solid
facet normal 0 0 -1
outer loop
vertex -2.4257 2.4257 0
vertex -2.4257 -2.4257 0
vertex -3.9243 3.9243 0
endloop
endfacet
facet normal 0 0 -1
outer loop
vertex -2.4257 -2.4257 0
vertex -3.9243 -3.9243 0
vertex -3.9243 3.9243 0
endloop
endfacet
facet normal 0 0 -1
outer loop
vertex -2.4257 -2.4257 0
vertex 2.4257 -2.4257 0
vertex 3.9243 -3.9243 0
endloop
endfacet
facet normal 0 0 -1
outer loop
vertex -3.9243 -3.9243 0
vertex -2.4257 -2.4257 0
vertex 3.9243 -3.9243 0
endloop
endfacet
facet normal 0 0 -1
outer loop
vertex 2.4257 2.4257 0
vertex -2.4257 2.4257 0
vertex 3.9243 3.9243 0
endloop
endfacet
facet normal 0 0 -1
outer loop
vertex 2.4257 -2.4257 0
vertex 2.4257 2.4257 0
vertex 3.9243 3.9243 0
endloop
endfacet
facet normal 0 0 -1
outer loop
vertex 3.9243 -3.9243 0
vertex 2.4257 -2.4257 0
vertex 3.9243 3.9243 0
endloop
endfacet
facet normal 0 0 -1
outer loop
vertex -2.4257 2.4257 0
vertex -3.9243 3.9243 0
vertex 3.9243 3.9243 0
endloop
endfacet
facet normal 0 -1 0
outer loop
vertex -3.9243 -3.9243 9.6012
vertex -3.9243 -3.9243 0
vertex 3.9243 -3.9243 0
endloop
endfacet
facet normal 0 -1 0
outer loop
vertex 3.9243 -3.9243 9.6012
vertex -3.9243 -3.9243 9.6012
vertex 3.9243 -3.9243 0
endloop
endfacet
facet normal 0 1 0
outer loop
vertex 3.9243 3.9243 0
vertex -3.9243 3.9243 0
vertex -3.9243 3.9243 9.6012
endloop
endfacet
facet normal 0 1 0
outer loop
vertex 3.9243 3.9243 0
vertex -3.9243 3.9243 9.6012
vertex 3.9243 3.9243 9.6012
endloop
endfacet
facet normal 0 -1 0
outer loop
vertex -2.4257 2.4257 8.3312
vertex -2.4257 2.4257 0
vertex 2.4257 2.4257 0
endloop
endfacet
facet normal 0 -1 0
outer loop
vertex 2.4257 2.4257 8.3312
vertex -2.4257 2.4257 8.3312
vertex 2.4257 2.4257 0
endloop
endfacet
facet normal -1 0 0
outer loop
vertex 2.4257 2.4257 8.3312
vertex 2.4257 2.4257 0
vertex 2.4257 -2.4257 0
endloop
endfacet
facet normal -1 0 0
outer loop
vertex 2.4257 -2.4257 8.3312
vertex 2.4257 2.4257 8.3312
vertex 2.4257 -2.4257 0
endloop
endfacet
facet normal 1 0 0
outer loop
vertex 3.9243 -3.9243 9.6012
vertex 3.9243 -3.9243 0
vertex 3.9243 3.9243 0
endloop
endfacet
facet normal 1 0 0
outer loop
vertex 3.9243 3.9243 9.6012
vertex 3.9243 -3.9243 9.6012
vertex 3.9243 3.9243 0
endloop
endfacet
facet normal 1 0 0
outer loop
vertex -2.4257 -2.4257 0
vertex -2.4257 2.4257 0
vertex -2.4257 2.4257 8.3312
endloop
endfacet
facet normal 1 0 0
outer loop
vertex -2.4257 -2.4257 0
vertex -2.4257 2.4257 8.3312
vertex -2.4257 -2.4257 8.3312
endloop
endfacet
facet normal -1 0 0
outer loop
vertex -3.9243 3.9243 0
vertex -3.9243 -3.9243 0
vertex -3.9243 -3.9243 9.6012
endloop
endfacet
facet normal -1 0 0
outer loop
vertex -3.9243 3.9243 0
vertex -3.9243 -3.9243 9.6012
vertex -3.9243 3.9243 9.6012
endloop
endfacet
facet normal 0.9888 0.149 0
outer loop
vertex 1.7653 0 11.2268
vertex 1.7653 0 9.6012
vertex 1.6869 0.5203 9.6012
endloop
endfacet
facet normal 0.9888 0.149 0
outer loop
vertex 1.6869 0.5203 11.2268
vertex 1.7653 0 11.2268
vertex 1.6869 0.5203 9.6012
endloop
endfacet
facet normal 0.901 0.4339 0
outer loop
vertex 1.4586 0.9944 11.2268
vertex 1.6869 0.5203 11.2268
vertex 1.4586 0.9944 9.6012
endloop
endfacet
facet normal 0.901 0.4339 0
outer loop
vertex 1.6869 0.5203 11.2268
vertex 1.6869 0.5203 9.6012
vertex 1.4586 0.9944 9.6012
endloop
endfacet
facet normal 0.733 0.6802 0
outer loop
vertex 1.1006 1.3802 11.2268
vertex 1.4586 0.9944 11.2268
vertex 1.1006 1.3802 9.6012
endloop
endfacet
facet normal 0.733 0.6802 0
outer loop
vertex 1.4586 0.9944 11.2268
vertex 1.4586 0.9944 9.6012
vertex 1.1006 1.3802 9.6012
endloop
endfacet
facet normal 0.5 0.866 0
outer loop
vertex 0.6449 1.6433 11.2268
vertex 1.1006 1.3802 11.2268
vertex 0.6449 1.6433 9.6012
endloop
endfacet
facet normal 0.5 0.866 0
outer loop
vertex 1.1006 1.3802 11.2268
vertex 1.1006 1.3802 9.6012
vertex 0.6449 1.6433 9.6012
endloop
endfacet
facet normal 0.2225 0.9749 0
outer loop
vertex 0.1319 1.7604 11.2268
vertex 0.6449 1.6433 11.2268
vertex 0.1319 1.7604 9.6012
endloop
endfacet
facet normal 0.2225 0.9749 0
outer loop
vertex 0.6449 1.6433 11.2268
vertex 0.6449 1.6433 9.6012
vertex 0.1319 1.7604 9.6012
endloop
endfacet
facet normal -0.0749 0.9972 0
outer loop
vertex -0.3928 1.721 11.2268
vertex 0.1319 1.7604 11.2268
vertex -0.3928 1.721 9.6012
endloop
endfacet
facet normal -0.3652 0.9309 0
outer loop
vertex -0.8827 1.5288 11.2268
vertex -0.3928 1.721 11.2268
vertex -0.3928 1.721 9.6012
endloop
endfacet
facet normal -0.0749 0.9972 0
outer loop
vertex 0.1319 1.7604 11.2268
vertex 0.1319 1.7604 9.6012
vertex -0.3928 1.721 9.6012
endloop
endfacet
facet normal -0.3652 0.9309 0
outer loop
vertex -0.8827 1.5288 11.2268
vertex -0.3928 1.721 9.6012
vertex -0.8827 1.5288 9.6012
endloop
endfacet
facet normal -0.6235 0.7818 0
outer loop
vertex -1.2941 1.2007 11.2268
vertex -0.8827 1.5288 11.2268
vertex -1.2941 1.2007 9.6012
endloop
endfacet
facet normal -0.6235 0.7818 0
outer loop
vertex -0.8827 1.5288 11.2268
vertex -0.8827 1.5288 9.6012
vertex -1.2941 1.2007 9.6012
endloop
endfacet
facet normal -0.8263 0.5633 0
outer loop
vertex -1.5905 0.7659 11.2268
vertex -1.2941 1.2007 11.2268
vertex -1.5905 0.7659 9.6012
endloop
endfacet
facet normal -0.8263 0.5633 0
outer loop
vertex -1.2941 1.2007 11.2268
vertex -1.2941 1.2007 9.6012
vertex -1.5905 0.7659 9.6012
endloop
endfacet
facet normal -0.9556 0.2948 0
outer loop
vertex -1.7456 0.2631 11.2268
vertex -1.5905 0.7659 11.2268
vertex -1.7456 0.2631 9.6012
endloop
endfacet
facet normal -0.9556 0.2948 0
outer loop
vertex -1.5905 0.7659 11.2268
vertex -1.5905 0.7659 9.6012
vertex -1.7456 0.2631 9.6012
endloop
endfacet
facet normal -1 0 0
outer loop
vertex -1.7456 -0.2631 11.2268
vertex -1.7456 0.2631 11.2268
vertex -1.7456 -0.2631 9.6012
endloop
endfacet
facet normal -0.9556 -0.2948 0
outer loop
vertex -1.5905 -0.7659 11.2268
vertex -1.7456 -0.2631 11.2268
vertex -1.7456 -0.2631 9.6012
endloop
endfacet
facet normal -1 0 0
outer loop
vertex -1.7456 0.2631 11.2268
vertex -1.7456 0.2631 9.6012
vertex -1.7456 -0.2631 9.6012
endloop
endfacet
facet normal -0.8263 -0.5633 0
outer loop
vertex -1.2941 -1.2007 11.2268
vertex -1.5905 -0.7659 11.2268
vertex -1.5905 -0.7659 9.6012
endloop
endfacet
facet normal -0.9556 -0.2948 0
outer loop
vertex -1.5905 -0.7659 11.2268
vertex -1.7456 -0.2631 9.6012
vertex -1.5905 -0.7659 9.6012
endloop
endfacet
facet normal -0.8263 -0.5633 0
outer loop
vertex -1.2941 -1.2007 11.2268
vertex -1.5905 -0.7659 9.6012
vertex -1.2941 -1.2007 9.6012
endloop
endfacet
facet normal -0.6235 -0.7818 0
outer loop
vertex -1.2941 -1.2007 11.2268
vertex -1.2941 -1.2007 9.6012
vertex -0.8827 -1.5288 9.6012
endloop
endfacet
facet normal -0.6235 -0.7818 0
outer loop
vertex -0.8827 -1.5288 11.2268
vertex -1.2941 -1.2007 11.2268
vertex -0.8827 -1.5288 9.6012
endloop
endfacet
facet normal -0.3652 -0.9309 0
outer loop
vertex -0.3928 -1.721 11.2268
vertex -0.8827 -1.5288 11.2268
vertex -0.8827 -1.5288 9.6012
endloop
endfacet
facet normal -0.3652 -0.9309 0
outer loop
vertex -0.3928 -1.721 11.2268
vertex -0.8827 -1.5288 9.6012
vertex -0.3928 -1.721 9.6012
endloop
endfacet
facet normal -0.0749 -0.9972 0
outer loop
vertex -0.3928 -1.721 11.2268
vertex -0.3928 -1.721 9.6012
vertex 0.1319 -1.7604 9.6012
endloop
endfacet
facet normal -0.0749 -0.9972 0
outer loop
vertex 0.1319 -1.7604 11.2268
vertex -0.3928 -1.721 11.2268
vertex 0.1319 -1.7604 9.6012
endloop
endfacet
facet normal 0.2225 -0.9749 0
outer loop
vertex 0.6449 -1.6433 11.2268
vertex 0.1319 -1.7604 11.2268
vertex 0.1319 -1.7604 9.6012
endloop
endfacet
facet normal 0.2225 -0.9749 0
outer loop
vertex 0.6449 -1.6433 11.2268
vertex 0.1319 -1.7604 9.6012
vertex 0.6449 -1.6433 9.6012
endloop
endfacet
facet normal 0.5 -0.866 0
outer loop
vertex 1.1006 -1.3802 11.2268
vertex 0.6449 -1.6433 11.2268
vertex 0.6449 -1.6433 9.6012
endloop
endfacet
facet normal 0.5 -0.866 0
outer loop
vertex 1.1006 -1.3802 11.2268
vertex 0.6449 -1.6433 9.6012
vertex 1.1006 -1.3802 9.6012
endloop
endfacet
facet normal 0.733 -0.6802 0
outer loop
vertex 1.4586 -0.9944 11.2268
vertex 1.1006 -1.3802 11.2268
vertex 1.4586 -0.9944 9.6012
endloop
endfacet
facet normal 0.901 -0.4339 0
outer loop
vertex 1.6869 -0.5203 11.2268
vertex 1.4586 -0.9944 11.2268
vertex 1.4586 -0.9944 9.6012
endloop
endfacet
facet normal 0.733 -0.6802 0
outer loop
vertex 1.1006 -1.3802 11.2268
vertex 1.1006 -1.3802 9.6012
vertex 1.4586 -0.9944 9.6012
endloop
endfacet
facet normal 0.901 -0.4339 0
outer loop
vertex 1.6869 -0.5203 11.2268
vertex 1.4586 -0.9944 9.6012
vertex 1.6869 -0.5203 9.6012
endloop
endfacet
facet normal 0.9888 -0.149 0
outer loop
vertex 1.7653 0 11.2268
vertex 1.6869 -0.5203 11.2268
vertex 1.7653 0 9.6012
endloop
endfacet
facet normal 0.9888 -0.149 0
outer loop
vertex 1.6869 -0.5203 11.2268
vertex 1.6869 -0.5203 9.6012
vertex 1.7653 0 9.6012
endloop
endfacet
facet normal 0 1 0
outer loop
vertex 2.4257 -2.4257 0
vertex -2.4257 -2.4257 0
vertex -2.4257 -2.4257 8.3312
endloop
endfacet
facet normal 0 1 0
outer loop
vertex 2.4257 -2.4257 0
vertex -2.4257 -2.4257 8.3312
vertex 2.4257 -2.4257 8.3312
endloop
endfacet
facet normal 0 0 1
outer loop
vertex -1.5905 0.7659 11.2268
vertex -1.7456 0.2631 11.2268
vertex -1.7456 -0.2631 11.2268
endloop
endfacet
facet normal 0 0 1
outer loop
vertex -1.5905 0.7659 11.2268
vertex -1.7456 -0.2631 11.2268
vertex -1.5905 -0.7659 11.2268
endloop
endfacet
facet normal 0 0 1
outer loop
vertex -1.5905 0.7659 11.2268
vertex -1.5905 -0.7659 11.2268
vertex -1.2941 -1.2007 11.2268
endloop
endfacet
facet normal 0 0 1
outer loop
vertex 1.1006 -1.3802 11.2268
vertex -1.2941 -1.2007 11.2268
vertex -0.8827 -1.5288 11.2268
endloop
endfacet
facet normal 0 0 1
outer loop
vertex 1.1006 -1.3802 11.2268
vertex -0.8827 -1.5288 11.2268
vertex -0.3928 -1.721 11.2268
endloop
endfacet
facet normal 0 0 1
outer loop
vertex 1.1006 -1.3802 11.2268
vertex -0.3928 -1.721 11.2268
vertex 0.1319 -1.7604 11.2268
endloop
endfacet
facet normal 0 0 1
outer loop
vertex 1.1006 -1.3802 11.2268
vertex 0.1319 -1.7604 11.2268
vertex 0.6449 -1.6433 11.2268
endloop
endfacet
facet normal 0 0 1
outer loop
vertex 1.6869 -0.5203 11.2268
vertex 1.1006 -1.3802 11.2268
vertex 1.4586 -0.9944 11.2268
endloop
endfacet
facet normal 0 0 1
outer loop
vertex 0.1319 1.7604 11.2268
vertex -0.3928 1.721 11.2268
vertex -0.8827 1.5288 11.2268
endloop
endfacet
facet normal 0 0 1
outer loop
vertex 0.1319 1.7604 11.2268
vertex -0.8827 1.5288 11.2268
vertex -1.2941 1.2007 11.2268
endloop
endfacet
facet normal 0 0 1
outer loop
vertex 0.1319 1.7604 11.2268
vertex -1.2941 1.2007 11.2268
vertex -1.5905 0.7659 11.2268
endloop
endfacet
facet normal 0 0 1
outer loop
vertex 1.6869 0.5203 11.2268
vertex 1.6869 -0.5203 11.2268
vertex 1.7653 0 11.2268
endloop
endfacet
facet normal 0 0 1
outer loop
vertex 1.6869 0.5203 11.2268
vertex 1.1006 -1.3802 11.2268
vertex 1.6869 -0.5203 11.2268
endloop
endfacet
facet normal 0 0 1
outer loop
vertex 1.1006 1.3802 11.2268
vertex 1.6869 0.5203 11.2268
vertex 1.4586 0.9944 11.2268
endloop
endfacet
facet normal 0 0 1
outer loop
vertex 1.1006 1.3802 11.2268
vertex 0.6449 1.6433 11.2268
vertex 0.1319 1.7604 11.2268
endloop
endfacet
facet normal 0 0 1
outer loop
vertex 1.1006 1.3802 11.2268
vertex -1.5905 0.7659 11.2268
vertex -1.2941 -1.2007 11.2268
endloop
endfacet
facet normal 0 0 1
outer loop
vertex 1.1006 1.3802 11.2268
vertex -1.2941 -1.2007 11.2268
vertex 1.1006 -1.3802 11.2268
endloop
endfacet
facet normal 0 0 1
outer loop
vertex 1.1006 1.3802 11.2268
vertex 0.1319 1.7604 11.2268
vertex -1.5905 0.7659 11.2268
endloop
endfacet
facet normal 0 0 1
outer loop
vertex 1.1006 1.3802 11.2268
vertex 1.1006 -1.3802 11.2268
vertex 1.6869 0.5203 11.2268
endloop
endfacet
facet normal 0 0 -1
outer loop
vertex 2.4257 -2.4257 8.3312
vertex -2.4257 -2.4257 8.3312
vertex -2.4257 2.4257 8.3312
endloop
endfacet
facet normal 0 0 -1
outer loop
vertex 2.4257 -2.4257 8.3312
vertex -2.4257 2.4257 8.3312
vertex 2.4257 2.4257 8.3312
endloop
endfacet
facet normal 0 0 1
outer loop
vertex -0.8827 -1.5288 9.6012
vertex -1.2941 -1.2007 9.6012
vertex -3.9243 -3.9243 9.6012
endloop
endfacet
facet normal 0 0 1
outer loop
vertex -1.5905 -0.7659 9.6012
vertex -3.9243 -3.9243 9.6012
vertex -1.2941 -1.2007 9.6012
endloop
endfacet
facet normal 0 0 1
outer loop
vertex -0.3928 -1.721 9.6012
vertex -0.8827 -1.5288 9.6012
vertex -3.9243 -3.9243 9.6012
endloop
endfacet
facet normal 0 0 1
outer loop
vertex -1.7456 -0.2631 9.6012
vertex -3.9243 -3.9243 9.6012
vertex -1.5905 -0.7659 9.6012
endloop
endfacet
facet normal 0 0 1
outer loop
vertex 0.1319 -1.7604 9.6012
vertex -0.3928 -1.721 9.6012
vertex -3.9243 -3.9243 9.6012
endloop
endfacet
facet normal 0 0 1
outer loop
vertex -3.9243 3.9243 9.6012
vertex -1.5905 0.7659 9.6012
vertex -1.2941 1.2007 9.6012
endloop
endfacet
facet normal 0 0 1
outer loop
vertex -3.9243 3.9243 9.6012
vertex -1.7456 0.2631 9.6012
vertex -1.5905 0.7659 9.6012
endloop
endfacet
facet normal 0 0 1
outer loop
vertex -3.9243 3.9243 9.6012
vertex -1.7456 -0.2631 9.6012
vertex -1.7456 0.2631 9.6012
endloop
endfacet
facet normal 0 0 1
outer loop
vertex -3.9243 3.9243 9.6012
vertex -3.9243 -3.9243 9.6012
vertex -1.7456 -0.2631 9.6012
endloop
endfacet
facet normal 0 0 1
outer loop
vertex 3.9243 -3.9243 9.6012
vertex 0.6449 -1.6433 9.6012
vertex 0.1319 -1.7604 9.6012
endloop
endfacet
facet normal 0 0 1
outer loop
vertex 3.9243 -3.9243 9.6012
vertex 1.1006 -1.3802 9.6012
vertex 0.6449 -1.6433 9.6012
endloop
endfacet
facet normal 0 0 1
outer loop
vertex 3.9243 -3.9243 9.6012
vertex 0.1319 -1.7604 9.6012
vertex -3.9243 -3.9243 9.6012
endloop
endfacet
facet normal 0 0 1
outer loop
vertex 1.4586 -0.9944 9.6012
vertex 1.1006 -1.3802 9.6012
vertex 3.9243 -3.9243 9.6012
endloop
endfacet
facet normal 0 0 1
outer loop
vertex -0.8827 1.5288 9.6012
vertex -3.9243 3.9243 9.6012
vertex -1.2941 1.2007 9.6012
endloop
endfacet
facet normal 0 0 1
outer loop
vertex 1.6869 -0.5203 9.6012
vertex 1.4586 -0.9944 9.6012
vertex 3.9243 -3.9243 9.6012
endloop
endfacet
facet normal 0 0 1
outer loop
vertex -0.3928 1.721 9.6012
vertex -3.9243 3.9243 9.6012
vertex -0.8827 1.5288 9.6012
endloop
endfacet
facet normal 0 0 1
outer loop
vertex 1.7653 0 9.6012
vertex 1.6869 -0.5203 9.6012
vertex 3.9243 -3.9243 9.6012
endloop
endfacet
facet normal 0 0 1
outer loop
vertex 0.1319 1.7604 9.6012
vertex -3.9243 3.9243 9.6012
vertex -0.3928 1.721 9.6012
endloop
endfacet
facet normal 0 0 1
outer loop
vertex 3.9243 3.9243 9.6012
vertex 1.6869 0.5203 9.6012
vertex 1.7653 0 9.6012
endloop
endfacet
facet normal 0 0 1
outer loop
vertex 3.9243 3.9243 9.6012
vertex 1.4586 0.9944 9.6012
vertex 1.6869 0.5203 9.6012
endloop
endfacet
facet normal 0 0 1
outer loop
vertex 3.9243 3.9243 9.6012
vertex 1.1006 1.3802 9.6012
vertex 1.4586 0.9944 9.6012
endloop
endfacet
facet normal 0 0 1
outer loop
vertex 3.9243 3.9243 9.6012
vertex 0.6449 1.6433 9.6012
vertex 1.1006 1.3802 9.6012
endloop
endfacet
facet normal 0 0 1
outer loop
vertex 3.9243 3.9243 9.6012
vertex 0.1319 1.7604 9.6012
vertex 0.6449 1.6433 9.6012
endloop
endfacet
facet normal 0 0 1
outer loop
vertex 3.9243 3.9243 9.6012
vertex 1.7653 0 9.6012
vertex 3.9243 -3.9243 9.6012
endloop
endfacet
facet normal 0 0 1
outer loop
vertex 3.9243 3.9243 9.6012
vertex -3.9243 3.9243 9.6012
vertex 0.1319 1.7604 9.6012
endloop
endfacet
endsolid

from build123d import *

# Parameters (mm, degrees)
F0_W     = 7.8486
F0_H     = 7.8486
F1_DEPTH = 9.6012
F2_R     = 1.7653
F3_DEPTH = 1.6256
F4_W     = 4.8514
F4_H     = 4.8514
F5_DEPTH = 8.3312


with BuildPart() as f1:
    # F0 (on Top) → F1 (new body)
    with BuildSketch(Plane.XY):
        Rectangle(F0_W, F0_H)
    extrude(amount=F1_DEPTH)

    # F2 (on face) → F3 (join)
    with BuildSketch(Plane.XY.offset(9.6012)):
        Circle(F2_R)
    extrude(amount=F3_DEPTH)

    # F4 (on face) → F5 (cut)
    with BuildSketch(Plane(origin=(0, 0, 0), x_dir=(1, 0, 0), z_dir=(0, 0, -1))):
        Rectangle(F4_W, F4_H)
    extrude(amount=-F5_DEPTH, mode=Mode.SUBTRACT)


solid = f1.part
